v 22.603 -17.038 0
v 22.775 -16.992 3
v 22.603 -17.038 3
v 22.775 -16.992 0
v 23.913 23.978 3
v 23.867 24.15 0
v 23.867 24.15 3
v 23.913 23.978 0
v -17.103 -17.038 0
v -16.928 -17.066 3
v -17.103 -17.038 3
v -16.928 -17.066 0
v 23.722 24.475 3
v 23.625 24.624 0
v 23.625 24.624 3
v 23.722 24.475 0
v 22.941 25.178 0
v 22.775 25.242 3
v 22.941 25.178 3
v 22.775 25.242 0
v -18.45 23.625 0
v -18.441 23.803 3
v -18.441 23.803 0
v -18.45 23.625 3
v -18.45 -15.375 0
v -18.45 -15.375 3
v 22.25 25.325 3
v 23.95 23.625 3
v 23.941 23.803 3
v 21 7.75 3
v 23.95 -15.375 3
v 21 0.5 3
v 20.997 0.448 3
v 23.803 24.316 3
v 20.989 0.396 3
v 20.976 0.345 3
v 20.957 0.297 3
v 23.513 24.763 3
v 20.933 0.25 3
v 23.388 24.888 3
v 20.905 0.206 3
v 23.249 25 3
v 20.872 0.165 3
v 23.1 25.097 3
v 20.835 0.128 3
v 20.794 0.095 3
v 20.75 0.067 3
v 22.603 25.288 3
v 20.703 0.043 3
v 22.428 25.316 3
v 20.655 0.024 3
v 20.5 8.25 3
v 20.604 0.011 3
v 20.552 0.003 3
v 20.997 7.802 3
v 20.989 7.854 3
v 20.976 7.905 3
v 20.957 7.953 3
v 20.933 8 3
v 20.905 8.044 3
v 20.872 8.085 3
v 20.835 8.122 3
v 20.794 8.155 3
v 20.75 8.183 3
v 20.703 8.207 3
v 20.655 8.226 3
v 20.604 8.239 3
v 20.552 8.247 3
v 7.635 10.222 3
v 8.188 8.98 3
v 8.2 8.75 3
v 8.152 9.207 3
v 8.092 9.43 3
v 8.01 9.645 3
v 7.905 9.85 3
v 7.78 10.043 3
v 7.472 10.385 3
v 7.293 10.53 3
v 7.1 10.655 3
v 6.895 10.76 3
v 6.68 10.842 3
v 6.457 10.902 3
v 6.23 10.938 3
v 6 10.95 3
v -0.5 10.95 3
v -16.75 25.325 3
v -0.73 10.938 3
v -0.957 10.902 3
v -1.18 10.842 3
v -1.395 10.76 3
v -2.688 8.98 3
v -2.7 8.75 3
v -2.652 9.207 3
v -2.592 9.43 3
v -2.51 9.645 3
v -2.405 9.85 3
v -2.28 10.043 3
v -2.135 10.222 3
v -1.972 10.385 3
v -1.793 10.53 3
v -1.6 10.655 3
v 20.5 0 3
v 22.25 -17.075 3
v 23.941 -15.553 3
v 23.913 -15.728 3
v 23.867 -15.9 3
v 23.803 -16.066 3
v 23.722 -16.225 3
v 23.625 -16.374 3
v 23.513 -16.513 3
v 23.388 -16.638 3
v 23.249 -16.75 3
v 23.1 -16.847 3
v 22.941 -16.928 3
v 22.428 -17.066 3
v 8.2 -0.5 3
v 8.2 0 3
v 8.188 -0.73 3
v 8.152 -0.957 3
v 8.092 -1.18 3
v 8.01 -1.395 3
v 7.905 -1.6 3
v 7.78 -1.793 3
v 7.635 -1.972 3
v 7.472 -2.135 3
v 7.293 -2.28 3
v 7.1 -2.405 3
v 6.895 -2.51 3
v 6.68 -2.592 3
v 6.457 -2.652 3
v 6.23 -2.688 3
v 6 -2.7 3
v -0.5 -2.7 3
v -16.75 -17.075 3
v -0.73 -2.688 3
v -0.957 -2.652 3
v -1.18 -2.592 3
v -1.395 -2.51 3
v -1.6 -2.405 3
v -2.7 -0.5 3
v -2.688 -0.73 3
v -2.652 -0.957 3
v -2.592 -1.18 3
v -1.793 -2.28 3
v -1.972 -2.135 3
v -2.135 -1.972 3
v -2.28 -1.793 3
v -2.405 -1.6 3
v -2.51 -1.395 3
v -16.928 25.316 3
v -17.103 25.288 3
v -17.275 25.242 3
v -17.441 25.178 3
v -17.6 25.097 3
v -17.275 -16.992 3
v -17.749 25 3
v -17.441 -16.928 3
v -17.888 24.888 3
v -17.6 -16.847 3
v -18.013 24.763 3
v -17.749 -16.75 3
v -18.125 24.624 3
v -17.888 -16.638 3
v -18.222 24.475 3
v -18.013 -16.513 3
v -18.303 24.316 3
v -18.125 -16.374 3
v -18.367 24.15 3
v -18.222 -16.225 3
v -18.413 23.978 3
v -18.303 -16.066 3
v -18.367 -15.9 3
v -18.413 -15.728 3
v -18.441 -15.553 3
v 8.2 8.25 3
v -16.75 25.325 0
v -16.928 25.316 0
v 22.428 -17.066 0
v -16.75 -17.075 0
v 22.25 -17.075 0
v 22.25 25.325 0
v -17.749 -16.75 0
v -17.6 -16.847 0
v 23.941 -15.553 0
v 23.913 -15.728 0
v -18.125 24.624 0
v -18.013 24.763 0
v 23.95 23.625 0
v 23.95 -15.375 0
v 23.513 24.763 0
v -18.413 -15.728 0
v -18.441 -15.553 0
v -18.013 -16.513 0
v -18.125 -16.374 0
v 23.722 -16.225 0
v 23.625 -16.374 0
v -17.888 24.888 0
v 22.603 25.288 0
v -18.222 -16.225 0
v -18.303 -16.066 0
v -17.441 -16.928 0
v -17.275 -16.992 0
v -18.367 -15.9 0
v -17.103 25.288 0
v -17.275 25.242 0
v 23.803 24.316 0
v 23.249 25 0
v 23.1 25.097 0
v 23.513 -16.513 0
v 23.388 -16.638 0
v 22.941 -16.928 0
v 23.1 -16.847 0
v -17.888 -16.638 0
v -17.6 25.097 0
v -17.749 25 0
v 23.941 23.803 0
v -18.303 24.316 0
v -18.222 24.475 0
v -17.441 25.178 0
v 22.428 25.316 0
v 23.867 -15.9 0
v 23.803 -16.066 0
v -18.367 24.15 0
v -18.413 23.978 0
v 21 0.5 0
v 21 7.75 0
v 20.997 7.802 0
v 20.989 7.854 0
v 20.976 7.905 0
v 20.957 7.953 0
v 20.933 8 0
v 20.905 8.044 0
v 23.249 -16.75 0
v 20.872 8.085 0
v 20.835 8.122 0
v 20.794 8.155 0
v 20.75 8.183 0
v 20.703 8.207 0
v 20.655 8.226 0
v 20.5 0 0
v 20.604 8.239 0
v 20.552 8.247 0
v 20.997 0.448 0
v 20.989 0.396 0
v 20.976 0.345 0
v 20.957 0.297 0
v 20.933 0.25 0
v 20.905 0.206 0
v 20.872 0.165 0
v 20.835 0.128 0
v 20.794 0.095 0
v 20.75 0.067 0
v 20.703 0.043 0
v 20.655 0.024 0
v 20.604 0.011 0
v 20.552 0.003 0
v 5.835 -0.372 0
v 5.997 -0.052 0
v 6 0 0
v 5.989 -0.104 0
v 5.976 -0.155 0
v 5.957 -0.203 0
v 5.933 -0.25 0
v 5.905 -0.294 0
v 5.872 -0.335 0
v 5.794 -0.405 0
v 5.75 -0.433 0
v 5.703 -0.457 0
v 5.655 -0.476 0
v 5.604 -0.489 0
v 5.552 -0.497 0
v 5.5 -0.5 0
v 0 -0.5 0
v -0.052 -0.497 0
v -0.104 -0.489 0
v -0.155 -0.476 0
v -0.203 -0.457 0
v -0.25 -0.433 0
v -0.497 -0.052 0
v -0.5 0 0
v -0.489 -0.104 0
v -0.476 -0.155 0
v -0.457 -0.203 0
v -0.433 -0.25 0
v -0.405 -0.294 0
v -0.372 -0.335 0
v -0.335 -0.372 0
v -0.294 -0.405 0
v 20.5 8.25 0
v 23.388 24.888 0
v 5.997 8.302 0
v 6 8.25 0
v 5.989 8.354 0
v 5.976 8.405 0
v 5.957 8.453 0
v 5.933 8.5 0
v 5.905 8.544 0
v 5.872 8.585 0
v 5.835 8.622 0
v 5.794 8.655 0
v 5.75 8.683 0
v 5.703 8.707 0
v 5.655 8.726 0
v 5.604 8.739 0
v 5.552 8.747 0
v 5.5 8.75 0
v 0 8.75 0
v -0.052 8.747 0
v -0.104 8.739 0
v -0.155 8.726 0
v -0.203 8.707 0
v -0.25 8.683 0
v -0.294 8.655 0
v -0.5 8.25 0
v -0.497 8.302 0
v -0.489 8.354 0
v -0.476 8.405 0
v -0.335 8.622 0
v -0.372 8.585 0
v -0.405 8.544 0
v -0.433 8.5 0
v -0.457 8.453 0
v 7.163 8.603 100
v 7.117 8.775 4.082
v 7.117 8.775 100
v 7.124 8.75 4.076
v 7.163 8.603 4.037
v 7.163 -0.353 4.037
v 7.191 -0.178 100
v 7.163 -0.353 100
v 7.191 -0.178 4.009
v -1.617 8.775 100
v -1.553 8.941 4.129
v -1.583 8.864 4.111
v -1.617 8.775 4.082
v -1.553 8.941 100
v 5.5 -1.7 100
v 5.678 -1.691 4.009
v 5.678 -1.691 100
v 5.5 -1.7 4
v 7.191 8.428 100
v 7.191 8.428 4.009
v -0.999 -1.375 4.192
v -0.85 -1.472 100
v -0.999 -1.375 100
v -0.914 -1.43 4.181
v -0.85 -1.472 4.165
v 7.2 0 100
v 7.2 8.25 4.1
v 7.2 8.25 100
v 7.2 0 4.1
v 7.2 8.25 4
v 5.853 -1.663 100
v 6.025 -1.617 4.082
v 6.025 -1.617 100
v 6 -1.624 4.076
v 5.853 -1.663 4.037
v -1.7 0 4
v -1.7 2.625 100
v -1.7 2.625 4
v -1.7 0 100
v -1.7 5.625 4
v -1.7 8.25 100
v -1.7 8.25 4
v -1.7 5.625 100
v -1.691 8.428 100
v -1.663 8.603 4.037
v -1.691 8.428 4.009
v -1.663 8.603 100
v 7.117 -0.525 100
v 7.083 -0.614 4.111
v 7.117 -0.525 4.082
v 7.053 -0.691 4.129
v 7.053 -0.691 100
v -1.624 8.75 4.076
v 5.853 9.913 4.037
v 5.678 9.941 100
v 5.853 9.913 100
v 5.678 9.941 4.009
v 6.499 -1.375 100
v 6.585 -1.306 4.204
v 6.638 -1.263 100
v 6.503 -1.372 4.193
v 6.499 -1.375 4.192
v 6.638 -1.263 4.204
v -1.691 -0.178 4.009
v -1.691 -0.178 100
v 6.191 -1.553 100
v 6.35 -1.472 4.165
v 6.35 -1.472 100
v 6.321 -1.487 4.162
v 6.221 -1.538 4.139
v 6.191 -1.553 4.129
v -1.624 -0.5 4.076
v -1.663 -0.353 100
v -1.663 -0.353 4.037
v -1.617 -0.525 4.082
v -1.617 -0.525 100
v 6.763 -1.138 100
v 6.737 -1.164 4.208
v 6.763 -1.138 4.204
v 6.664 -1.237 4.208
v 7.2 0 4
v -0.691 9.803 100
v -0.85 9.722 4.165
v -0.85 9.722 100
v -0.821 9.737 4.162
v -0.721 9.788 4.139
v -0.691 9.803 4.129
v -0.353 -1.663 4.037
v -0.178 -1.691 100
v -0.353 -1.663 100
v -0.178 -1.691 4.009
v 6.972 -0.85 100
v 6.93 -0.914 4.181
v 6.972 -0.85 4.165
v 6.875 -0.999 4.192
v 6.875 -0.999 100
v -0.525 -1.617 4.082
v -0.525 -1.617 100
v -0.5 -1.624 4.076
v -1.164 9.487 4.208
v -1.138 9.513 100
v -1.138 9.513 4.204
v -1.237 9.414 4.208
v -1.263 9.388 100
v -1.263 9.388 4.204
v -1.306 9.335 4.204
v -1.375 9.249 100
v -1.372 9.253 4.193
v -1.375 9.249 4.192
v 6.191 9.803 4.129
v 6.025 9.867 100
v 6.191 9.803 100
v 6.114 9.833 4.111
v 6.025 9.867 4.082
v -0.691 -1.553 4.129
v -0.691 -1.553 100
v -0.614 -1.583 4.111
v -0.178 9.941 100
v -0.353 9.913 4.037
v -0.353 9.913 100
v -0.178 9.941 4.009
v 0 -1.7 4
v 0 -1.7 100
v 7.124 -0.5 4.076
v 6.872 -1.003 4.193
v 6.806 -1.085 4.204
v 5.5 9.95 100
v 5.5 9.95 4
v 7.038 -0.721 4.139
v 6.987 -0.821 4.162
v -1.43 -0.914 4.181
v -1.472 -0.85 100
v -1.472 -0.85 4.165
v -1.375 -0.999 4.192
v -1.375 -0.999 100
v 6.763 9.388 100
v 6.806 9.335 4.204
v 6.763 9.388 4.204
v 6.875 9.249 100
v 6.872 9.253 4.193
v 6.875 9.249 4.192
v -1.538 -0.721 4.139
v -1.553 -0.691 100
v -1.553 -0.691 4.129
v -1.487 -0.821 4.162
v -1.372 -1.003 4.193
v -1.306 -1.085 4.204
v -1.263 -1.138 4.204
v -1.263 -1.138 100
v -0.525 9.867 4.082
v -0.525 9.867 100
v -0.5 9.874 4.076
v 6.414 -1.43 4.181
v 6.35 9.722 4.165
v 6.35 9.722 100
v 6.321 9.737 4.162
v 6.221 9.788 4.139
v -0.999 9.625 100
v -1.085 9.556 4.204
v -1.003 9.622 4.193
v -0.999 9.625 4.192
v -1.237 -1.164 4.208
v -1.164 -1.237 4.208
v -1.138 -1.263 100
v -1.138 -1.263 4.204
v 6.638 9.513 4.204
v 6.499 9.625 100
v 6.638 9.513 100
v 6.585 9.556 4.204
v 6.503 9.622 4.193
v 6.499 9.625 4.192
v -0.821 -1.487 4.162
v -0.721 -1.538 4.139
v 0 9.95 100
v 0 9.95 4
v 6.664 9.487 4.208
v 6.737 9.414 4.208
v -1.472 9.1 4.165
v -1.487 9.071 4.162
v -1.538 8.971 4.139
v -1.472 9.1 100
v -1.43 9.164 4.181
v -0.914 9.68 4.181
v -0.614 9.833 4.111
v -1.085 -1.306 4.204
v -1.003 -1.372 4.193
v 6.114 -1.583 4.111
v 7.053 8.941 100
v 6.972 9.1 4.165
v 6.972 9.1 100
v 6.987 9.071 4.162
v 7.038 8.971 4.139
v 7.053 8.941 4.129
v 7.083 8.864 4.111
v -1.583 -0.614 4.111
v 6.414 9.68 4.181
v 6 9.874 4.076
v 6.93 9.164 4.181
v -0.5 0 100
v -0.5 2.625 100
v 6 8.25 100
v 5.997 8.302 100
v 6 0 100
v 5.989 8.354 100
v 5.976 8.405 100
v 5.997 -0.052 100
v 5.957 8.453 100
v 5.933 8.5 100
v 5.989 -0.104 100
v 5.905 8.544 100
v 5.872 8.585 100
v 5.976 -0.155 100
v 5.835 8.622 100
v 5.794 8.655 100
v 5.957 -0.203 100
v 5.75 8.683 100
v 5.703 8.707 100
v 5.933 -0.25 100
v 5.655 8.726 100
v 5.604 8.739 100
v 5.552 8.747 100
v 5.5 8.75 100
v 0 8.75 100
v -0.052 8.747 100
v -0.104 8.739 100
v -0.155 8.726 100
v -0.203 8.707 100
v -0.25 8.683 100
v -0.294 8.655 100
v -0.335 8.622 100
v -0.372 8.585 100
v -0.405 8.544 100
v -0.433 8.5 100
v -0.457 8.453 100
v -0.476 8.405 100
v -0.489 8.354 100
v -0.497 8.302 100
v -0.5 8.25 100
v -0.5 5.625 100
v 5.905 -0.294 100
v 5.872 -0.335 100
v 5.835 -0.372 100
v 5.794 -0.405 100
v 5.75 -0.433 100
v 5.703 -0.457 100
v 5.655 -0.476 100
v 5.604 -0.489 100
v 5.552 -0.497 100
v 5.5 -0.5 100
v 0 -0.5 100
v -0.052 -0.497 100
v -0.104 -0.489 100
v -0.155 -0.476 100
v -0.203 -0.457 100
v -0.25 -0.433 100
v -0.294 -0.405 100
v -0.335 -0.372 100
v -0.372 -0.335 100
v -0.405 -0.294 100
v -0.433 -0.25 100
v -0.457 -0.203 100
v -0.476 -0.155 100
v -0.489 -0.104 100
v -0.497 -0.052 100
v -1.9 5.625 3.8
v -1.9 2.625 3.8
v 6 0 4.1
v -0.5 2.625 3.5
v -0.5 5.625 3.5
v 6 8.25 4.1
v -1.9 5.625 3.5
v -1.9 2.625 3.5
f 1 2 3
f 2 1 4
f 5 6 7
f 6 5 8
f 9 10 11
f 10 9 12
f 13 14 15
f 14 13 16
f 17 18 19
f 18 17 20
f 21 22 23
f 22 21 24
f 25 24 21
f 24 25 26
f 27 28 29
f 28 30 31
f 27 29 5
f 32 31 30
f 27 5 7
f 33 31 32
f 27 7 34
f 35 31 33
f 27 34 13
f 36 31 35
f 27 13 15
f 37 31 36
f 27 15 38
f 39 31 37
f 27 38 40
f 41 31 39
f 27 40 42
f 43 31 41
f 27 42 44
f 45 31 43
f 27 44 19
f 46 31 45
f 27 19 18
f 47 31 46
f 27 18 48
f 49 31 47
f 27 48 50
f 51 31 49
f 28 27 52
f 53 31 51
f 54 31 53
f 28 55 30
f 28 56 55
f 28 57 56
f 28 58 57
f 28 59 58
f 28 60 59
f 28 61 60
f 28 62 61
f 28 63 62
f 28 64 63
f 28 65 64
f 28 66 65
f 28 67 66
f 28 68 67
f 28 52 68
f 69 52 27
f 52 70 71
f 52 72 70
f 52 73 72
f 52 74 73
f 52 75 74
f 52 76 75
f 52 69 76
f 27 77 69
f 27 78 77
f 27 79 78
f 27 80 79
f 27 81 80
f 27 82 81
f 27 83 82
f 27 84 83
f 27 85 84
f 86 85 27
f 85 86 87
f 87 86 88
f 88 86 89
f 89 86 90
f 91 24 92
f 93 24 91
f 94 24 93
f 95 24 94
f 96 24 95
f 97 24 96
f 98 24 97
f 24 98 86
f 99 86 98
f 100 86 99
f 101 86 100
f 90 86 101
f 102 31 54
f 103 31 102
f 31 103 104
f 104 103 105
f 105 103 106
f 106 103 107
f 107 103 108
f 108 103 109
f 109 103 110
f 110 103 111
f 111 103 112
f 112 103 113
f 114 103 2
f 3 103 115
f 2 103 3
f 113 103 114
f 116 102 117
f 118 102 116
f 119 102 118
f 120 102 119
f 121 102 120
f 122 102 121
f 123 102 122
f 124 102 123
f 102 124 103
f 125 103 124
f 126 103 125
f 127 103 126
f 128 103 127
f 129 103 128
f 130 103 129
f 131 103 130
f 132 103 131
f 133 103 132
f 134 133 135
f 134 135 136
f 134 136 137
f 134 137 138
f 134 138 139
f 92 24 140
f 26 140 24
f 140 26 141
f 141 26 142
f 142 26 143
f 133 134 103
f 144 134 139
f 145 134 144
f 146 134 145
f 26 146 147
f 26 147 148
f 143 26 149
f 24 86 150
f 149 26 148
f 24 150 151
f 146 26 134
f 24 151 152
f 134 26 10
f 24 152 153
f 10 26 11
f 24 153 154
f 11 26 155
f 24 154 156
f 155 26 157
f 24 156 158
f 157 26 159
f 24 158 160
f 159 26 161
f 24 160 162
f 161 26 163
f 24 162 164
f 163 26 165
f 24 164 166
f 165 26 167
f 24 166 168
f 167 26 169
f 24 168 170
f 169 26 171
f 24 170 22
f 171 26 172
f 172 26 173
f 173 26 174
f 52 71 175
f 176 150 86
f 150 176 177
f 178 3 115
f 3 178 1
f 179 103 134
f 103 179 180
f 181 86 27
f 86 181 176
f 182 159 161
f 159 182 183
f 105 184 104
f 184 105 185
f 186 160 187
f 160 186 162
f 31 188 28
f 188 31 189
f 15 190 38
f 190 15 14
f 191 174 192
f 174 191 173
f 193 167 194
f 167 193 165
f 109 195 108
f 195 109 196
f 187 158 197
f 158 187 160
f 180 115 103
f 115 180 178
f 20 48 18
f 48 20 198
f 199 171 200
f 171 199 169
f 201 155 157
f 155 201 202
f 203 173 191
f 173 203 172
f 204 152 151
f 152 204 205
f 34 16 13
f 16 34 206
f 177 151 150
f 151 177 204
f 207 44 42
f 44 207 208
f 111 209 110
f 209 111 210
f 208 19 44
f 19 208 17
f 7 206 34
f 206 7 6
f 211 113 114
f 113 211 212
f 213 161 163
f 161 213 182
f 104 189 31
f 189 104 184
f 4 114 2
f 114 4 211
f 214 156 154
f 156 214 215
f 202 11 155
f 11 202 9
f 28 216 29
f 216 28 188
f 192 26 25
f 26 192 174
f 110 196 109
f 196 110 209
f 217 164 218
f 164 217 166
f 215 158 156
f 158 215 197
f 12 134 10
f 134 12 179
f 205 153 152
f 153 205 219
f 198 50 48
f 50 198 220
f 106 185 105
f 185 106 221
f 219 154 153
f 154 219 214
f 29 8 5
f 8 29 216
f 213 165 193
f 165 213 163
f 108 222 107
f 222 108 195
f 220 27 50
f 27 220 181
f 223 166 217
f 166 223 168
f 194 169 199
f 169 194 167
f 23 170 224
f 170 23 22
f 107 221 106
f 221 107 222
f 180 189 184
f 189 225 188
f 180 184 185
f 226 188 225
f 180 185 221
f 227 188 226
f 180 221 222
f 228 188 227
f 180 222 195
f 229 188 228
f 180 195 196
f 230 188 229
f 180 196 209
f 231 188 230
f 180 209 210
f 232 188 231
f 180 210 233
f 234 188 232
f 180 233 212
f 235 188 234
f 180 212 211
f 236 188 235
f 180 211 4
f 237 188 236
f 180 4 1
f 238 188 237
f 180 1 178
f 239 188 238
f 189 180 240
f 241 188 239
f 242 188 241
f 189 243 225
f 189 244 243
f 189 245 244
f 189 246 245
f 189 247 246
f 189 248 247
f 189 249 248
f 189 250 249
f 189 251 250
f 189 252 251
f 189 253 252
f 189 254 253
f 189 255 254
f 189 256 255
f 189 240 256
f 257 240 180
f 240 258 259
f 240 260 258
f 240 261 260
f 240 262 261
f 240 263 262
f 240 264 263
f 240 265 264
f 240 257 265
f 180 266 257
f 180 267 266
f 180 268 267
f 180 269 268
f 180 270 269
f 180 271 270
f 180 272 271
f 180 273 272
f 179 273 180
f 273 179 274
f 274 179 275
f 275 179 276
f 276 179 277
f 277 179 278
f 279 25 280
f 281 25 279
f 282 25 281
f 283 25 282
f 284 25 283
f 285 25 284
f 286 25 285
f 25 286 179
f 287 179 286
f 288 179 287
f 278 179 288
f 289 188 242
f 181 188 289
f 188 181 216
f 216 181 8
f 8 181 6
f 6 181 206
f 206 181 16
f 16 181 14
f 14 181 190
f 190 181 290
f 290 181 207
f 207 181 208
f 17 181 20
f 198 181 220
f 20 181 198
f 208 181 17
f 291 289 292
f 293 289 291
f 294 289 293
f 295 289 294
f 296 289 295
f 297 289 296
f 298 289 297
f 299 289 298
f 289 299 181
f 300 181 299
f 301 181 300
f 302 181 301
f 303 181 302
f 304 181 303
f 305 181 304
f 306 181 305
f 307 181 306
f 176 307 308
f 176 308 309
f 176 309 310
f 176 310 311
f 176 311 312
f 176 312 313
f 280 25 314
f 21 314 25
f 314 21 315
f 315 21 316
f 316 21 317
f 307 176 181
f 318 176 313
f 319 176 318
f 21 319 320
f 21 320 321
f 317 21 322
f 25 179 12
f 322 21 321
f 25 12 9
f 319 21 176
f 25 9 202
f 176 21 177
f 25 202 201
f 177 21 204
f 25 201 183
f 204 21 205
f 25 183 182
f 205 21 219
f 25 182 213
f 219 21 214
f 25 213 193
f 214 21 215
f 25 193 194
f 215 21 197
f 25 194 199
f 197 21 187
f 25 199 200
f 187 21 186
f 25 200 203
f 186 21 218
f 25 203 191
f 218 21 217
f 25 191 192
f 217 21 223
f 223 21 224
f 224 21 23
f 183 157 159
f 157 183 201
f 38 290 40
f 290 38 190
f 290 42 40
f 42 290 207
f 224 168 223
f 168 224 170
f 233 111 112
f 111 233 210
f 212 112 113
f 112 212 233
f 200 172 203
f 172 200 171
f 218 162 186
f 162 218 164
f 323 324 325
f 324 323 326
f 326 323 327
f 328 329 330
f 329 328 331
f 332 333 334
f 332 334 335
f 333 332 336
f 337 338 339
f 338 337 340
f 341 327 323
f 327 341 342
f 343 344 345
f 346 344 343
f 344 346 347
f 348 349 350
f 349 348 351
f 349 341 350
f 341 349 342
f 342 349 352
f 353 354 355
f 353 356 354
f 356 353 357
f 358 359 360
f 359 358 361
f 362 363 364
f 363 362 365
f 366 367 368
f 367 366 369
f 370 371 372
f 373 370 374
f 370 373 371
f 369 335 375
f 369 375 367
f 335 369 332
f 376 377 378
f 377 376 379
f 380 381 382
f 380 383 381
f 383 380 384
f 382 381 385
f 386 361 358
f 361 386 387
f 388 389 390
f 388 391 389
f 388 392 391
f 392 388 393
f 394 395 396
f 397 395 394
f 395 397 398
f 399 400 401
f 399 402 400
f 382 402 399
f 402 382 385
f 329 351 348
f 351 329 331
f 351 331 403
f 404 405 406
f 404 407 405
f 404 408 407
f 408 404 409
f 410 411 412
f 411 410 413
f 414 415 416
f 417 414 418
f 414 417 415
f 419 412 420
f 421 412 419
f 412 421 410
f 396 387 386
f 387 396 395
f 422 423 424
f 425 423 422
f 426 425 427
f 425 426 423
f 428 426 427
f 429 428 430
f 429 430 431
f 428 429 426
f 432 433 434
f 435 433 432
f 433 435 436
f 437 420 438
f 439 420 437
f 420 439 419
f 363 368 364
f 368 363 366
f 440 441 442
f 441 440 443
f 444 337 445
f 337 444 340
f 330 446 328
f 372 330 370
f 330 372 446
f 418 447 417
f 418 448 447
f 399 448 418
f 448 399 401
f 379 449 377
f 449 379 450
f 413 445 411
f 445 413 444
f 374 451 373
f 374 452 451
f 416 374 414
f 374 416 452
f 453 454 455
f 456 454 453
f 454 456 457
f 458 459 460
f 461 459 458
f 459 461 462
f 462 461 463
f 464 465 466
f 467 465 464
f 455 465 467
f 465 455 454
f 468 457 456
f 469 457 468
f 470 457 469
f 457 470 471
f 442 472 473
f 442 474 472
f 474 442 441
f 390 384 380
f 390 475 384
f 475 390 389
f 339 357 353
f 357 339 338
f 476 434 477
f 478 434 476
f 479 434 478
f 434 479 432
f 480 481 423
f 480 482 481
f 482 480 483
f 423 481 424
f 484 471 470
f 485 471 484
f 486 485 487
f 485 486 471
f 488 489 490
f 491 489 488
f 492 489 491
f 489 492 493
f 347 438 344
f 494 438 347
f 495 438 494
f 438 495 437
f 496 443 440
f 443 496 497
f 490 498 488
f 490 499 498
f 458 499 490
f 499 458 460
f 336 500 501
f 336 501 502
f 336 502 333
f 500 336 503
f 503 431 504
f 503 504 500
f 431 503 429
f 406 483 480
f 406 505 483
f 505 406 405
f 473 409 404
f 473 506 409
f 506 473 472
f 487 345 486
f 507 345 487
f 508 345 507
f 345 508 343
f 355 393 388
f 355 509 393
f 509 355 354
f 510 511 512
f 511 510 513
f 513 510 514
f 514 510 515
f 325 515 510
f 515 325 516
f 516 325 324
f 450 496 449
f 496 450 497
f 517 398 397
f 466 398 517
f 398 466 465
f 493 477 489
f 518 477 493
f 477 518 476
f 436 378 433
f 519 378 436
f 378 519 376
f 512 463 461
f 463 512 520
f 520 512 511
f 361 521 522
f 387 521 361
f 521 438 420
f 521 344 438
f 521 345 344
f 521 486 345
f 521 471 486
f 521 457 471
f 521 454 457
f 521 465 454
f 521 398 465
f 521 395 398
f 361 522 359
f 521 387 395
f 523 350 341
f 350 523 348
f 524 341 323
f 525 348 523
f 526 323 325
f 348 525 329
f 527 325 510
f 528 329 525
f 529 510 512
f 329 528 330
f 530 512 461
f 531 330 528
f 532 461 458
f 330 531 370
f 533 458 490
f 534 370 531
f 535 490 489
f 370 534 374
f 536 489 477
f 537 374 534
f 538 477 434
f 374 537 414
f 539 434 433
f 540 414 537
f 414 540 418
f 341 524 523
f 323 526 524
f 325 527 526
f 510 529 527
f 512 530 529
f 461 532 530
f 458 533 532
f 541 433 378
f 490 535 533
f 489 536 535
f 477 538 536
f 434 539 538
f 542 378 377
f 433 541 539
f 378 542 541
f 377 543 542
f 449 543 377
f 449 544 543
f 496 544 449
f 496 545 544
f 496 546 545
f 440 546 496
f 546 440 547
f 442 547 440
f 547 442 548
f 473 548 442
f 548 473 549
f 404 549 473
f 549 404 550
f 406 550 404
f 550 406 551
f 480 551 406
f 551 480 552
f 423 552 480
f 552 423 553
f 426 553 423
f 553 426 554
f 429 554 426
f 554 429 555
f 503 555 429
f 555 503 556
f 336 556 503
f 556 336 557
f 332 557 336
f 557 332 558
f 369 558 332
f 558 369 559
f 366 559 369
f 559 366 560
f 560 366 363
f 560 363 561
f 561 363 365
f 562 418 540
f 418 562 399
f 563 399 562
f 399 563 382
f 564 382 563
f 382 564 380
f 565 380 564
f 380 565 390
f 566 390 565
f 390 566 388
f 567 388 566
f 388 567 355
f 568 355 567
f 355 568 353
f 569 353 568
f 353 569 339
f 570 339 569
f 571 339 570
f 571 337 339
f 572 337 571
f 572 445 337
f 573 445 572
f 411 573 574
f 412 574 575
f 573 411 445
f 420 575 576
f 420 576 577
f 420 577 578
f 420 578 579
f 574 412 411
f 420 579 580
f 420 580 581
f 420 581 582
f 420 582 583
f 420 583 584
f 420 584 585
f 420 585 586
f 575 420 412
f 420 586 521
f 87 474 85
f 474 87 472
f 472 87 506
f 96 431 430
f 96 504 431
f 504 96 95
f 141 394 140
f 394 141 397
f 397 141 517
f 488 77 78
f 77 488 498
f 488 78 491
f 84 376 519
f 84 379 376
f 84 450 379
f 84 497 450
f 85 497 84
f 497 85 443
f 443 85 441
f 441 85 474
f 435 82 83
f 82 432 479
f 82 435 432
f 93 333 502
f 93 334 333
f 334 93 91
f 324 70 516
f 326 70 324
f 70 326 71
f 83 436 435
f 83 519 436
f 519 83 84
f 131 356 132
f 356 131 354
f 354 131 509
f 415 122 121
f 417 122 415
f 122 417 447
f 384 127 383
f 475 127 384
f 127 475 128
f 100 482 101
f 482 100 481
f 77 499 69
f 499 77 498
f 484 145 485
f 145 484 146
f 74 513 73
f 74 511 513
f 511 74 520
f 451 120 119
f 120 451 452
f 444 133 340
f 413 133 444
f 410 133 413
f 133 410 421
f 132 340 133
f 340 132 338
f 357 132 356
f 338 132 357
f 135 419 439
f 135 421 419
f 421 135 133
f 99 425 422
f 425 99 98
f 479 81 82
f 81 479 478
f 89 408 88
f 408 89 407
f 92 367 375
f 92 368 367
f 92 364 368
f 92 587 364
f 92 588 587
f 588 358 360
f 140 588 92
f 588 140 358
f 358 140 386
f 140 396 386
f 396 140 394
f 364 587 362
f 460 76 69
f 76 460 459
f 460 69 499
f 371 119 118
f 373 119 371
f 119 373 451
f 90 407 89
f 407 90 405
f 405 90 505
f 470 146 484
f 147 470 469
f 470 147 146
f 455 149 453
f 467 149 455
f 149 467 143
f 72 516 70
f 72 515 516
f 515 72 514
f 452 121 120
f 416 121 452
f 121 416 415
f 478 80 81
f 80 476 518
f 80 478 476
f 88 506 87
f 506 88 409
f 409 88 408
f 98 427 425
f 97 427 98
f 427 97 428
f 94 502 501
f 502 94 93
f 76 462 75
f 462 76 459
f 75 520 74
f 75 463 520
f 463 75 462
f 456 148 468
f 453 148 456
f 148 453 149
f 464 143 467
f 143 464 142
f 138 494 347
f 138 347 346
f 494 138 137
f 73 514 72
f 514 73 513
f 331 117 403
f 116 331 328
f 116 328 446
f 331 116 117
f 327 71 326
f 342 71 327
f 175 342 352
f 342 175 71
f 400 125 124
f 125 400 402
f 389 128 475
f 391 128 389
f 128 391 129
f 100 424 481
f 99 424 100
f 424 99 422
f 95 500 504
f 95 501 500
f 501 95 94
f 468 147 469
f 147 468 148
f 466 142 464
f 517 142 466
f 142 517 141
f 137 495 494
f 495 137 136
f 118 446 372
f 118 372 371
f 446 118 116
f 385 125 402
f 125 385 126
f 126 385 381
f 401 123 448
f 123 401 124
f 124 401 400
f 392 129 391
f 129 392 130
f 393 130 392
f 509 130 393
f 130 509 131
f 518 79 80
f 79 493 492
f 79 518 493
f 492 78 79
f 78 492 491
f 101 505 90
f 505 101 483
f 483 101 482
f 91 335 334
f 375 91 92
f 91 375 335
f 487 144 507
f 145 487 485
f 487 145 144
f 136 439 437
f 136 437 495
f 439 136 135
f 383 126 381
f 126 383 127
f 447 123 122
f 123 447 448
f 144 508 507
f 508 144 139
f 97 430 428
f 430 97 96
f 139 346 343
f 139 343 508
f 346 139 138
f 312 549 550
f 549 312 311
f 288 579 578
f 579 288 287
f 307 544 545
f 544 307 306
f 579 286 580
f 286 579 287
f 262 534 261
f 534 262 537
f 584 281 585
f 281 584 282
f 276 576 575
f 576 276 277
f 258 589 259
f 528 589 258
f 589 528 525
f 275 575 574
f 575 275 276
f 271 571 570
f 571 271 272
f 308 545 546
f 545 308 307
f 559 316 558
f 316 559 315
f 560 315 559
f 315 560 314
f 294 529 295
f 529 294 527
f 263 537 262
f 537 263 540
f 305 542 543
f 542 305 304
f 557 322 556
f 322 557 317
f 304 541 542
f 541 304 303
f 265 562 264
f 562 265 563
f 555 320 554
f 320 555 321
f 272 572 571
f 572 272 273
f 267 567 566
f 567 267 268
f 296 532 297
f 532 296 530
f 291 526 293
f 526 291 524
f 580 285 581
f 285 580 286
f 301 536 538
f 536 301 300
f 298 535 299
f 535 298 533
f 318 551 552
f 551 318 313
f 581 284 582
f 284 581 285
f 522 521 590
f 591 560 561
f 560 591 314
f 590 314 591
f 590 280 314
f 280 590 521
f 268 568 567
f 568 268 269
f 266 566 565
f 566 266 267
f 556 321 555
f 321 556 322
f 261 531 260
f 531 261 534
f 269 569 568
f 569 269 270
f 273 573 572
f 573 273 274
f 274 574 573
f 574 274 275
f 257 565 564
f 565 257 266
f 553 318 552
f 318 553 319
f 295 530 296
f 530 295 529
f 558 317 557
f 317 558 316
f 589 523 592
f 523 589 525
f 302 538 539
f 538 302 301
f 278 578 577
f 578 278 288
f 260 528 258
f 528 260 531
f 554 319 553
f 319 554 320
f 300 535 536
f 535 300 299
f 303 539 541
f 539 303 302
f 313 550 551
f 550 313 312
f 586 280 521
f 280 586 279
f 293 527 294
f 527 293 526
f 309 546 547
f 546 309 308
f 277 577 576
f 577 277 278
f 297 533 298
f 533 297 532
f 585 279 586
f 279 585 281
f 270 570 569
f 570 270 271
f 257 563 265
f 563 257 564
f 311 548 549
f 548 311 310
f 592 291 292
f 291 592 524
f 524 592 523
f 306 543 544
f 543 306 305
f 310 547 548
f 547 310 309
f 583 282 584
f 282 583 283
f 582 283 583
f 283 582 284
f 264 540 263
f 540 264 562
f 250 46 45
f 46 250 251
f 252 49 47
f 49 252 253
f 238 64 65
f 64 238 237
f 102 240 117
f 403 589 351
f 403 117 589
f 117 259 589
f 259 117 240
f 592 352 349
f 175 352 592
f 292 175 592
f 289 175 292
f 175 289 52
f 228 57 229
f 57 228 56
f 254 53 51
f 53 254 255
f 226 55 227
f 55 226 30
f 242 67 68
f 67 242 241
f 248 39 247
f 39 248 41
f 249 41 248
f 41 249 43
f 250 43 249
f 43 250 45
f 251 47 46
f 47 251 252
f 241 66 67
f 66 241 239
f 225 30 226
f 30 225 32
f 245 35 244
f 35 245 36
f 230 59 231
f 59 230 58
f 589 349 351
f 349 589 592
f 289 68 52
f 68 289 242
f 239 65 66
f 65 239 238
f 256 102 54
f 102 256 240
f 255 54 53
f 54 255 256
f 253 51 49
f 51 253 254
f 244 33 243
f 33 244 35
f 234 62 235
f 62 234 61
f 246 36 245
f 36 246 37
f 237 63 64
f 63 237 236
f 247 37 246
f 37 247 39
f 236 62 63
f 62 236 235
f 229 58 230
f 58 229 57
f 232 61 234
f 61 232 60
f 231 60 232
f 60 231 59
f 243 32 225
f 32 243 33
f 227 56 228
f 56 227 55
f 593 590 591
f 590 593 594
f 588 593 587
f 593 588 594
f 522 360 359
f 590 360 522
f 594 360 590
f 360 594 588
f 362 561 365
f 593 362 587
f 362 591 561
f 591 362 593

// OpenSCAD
x_width = 6.5;
y_width = 9.25;
z_height = 100;

wall_thickness = 1.2;
radius = 0.5;

base_width = 40;
base_thickness = 3;
wire_thickness = 4.0;
back_slit = 3;

$fn=60;

difference() {
  union() {
    // base
    translate([base_width / -2 + x_width / 2, base_width / -2 + y_width / 2, 0]) {
      minkowski() {
        cube([base_width - 2 * radius, base_width - 2 * radius, base_thickness - 0.1]);
        cylinder(r=radius + wall_thickness, 0.1);
      }
    }

    // upright tube
    minkowski() {
      cube([x_width - 2 * radius, y_width - 2 * radius, z_height - 0.1]);
      cylinder(r=radius + wall_thickness, 0.1);
    }

    // inside chamfer
    translate([-radius, -radius, 0]) {
      minkowski() {
        cube([x_width, y_width, base_thickness]);
        cylinder(r1=(2 * radius + wall_thickness), r2=0, 2 * radius + wall_thickness);
      }
    }
  }

  // center cut-out
  translate([0,0,-0.1]) {
    minkowski() {
      cube([x_width - 2 * radius, y_width - 2 * radius, z_height + 0.1]);
      cylinder(r=radius, 0.1);
    }
  }

  // wire slit
  translate([radius, radius, -0.1]) {
    minkowski() {
      cube([base_width / 2, y_width - 4 * radius, wire_thickness + 0.1]);
      cylinder(r=radius, 0.1);
    }
  }
  // back slit
  translate([-0.1, (y_width - 2 * radius - back_slit) / 2 , base_thickness + radius]) {
    rotate([0,-90,0]) {
      cube([z_height + 0.2, back_slit, wall_thickness + radius + 0.1]);
    }
  }
}
